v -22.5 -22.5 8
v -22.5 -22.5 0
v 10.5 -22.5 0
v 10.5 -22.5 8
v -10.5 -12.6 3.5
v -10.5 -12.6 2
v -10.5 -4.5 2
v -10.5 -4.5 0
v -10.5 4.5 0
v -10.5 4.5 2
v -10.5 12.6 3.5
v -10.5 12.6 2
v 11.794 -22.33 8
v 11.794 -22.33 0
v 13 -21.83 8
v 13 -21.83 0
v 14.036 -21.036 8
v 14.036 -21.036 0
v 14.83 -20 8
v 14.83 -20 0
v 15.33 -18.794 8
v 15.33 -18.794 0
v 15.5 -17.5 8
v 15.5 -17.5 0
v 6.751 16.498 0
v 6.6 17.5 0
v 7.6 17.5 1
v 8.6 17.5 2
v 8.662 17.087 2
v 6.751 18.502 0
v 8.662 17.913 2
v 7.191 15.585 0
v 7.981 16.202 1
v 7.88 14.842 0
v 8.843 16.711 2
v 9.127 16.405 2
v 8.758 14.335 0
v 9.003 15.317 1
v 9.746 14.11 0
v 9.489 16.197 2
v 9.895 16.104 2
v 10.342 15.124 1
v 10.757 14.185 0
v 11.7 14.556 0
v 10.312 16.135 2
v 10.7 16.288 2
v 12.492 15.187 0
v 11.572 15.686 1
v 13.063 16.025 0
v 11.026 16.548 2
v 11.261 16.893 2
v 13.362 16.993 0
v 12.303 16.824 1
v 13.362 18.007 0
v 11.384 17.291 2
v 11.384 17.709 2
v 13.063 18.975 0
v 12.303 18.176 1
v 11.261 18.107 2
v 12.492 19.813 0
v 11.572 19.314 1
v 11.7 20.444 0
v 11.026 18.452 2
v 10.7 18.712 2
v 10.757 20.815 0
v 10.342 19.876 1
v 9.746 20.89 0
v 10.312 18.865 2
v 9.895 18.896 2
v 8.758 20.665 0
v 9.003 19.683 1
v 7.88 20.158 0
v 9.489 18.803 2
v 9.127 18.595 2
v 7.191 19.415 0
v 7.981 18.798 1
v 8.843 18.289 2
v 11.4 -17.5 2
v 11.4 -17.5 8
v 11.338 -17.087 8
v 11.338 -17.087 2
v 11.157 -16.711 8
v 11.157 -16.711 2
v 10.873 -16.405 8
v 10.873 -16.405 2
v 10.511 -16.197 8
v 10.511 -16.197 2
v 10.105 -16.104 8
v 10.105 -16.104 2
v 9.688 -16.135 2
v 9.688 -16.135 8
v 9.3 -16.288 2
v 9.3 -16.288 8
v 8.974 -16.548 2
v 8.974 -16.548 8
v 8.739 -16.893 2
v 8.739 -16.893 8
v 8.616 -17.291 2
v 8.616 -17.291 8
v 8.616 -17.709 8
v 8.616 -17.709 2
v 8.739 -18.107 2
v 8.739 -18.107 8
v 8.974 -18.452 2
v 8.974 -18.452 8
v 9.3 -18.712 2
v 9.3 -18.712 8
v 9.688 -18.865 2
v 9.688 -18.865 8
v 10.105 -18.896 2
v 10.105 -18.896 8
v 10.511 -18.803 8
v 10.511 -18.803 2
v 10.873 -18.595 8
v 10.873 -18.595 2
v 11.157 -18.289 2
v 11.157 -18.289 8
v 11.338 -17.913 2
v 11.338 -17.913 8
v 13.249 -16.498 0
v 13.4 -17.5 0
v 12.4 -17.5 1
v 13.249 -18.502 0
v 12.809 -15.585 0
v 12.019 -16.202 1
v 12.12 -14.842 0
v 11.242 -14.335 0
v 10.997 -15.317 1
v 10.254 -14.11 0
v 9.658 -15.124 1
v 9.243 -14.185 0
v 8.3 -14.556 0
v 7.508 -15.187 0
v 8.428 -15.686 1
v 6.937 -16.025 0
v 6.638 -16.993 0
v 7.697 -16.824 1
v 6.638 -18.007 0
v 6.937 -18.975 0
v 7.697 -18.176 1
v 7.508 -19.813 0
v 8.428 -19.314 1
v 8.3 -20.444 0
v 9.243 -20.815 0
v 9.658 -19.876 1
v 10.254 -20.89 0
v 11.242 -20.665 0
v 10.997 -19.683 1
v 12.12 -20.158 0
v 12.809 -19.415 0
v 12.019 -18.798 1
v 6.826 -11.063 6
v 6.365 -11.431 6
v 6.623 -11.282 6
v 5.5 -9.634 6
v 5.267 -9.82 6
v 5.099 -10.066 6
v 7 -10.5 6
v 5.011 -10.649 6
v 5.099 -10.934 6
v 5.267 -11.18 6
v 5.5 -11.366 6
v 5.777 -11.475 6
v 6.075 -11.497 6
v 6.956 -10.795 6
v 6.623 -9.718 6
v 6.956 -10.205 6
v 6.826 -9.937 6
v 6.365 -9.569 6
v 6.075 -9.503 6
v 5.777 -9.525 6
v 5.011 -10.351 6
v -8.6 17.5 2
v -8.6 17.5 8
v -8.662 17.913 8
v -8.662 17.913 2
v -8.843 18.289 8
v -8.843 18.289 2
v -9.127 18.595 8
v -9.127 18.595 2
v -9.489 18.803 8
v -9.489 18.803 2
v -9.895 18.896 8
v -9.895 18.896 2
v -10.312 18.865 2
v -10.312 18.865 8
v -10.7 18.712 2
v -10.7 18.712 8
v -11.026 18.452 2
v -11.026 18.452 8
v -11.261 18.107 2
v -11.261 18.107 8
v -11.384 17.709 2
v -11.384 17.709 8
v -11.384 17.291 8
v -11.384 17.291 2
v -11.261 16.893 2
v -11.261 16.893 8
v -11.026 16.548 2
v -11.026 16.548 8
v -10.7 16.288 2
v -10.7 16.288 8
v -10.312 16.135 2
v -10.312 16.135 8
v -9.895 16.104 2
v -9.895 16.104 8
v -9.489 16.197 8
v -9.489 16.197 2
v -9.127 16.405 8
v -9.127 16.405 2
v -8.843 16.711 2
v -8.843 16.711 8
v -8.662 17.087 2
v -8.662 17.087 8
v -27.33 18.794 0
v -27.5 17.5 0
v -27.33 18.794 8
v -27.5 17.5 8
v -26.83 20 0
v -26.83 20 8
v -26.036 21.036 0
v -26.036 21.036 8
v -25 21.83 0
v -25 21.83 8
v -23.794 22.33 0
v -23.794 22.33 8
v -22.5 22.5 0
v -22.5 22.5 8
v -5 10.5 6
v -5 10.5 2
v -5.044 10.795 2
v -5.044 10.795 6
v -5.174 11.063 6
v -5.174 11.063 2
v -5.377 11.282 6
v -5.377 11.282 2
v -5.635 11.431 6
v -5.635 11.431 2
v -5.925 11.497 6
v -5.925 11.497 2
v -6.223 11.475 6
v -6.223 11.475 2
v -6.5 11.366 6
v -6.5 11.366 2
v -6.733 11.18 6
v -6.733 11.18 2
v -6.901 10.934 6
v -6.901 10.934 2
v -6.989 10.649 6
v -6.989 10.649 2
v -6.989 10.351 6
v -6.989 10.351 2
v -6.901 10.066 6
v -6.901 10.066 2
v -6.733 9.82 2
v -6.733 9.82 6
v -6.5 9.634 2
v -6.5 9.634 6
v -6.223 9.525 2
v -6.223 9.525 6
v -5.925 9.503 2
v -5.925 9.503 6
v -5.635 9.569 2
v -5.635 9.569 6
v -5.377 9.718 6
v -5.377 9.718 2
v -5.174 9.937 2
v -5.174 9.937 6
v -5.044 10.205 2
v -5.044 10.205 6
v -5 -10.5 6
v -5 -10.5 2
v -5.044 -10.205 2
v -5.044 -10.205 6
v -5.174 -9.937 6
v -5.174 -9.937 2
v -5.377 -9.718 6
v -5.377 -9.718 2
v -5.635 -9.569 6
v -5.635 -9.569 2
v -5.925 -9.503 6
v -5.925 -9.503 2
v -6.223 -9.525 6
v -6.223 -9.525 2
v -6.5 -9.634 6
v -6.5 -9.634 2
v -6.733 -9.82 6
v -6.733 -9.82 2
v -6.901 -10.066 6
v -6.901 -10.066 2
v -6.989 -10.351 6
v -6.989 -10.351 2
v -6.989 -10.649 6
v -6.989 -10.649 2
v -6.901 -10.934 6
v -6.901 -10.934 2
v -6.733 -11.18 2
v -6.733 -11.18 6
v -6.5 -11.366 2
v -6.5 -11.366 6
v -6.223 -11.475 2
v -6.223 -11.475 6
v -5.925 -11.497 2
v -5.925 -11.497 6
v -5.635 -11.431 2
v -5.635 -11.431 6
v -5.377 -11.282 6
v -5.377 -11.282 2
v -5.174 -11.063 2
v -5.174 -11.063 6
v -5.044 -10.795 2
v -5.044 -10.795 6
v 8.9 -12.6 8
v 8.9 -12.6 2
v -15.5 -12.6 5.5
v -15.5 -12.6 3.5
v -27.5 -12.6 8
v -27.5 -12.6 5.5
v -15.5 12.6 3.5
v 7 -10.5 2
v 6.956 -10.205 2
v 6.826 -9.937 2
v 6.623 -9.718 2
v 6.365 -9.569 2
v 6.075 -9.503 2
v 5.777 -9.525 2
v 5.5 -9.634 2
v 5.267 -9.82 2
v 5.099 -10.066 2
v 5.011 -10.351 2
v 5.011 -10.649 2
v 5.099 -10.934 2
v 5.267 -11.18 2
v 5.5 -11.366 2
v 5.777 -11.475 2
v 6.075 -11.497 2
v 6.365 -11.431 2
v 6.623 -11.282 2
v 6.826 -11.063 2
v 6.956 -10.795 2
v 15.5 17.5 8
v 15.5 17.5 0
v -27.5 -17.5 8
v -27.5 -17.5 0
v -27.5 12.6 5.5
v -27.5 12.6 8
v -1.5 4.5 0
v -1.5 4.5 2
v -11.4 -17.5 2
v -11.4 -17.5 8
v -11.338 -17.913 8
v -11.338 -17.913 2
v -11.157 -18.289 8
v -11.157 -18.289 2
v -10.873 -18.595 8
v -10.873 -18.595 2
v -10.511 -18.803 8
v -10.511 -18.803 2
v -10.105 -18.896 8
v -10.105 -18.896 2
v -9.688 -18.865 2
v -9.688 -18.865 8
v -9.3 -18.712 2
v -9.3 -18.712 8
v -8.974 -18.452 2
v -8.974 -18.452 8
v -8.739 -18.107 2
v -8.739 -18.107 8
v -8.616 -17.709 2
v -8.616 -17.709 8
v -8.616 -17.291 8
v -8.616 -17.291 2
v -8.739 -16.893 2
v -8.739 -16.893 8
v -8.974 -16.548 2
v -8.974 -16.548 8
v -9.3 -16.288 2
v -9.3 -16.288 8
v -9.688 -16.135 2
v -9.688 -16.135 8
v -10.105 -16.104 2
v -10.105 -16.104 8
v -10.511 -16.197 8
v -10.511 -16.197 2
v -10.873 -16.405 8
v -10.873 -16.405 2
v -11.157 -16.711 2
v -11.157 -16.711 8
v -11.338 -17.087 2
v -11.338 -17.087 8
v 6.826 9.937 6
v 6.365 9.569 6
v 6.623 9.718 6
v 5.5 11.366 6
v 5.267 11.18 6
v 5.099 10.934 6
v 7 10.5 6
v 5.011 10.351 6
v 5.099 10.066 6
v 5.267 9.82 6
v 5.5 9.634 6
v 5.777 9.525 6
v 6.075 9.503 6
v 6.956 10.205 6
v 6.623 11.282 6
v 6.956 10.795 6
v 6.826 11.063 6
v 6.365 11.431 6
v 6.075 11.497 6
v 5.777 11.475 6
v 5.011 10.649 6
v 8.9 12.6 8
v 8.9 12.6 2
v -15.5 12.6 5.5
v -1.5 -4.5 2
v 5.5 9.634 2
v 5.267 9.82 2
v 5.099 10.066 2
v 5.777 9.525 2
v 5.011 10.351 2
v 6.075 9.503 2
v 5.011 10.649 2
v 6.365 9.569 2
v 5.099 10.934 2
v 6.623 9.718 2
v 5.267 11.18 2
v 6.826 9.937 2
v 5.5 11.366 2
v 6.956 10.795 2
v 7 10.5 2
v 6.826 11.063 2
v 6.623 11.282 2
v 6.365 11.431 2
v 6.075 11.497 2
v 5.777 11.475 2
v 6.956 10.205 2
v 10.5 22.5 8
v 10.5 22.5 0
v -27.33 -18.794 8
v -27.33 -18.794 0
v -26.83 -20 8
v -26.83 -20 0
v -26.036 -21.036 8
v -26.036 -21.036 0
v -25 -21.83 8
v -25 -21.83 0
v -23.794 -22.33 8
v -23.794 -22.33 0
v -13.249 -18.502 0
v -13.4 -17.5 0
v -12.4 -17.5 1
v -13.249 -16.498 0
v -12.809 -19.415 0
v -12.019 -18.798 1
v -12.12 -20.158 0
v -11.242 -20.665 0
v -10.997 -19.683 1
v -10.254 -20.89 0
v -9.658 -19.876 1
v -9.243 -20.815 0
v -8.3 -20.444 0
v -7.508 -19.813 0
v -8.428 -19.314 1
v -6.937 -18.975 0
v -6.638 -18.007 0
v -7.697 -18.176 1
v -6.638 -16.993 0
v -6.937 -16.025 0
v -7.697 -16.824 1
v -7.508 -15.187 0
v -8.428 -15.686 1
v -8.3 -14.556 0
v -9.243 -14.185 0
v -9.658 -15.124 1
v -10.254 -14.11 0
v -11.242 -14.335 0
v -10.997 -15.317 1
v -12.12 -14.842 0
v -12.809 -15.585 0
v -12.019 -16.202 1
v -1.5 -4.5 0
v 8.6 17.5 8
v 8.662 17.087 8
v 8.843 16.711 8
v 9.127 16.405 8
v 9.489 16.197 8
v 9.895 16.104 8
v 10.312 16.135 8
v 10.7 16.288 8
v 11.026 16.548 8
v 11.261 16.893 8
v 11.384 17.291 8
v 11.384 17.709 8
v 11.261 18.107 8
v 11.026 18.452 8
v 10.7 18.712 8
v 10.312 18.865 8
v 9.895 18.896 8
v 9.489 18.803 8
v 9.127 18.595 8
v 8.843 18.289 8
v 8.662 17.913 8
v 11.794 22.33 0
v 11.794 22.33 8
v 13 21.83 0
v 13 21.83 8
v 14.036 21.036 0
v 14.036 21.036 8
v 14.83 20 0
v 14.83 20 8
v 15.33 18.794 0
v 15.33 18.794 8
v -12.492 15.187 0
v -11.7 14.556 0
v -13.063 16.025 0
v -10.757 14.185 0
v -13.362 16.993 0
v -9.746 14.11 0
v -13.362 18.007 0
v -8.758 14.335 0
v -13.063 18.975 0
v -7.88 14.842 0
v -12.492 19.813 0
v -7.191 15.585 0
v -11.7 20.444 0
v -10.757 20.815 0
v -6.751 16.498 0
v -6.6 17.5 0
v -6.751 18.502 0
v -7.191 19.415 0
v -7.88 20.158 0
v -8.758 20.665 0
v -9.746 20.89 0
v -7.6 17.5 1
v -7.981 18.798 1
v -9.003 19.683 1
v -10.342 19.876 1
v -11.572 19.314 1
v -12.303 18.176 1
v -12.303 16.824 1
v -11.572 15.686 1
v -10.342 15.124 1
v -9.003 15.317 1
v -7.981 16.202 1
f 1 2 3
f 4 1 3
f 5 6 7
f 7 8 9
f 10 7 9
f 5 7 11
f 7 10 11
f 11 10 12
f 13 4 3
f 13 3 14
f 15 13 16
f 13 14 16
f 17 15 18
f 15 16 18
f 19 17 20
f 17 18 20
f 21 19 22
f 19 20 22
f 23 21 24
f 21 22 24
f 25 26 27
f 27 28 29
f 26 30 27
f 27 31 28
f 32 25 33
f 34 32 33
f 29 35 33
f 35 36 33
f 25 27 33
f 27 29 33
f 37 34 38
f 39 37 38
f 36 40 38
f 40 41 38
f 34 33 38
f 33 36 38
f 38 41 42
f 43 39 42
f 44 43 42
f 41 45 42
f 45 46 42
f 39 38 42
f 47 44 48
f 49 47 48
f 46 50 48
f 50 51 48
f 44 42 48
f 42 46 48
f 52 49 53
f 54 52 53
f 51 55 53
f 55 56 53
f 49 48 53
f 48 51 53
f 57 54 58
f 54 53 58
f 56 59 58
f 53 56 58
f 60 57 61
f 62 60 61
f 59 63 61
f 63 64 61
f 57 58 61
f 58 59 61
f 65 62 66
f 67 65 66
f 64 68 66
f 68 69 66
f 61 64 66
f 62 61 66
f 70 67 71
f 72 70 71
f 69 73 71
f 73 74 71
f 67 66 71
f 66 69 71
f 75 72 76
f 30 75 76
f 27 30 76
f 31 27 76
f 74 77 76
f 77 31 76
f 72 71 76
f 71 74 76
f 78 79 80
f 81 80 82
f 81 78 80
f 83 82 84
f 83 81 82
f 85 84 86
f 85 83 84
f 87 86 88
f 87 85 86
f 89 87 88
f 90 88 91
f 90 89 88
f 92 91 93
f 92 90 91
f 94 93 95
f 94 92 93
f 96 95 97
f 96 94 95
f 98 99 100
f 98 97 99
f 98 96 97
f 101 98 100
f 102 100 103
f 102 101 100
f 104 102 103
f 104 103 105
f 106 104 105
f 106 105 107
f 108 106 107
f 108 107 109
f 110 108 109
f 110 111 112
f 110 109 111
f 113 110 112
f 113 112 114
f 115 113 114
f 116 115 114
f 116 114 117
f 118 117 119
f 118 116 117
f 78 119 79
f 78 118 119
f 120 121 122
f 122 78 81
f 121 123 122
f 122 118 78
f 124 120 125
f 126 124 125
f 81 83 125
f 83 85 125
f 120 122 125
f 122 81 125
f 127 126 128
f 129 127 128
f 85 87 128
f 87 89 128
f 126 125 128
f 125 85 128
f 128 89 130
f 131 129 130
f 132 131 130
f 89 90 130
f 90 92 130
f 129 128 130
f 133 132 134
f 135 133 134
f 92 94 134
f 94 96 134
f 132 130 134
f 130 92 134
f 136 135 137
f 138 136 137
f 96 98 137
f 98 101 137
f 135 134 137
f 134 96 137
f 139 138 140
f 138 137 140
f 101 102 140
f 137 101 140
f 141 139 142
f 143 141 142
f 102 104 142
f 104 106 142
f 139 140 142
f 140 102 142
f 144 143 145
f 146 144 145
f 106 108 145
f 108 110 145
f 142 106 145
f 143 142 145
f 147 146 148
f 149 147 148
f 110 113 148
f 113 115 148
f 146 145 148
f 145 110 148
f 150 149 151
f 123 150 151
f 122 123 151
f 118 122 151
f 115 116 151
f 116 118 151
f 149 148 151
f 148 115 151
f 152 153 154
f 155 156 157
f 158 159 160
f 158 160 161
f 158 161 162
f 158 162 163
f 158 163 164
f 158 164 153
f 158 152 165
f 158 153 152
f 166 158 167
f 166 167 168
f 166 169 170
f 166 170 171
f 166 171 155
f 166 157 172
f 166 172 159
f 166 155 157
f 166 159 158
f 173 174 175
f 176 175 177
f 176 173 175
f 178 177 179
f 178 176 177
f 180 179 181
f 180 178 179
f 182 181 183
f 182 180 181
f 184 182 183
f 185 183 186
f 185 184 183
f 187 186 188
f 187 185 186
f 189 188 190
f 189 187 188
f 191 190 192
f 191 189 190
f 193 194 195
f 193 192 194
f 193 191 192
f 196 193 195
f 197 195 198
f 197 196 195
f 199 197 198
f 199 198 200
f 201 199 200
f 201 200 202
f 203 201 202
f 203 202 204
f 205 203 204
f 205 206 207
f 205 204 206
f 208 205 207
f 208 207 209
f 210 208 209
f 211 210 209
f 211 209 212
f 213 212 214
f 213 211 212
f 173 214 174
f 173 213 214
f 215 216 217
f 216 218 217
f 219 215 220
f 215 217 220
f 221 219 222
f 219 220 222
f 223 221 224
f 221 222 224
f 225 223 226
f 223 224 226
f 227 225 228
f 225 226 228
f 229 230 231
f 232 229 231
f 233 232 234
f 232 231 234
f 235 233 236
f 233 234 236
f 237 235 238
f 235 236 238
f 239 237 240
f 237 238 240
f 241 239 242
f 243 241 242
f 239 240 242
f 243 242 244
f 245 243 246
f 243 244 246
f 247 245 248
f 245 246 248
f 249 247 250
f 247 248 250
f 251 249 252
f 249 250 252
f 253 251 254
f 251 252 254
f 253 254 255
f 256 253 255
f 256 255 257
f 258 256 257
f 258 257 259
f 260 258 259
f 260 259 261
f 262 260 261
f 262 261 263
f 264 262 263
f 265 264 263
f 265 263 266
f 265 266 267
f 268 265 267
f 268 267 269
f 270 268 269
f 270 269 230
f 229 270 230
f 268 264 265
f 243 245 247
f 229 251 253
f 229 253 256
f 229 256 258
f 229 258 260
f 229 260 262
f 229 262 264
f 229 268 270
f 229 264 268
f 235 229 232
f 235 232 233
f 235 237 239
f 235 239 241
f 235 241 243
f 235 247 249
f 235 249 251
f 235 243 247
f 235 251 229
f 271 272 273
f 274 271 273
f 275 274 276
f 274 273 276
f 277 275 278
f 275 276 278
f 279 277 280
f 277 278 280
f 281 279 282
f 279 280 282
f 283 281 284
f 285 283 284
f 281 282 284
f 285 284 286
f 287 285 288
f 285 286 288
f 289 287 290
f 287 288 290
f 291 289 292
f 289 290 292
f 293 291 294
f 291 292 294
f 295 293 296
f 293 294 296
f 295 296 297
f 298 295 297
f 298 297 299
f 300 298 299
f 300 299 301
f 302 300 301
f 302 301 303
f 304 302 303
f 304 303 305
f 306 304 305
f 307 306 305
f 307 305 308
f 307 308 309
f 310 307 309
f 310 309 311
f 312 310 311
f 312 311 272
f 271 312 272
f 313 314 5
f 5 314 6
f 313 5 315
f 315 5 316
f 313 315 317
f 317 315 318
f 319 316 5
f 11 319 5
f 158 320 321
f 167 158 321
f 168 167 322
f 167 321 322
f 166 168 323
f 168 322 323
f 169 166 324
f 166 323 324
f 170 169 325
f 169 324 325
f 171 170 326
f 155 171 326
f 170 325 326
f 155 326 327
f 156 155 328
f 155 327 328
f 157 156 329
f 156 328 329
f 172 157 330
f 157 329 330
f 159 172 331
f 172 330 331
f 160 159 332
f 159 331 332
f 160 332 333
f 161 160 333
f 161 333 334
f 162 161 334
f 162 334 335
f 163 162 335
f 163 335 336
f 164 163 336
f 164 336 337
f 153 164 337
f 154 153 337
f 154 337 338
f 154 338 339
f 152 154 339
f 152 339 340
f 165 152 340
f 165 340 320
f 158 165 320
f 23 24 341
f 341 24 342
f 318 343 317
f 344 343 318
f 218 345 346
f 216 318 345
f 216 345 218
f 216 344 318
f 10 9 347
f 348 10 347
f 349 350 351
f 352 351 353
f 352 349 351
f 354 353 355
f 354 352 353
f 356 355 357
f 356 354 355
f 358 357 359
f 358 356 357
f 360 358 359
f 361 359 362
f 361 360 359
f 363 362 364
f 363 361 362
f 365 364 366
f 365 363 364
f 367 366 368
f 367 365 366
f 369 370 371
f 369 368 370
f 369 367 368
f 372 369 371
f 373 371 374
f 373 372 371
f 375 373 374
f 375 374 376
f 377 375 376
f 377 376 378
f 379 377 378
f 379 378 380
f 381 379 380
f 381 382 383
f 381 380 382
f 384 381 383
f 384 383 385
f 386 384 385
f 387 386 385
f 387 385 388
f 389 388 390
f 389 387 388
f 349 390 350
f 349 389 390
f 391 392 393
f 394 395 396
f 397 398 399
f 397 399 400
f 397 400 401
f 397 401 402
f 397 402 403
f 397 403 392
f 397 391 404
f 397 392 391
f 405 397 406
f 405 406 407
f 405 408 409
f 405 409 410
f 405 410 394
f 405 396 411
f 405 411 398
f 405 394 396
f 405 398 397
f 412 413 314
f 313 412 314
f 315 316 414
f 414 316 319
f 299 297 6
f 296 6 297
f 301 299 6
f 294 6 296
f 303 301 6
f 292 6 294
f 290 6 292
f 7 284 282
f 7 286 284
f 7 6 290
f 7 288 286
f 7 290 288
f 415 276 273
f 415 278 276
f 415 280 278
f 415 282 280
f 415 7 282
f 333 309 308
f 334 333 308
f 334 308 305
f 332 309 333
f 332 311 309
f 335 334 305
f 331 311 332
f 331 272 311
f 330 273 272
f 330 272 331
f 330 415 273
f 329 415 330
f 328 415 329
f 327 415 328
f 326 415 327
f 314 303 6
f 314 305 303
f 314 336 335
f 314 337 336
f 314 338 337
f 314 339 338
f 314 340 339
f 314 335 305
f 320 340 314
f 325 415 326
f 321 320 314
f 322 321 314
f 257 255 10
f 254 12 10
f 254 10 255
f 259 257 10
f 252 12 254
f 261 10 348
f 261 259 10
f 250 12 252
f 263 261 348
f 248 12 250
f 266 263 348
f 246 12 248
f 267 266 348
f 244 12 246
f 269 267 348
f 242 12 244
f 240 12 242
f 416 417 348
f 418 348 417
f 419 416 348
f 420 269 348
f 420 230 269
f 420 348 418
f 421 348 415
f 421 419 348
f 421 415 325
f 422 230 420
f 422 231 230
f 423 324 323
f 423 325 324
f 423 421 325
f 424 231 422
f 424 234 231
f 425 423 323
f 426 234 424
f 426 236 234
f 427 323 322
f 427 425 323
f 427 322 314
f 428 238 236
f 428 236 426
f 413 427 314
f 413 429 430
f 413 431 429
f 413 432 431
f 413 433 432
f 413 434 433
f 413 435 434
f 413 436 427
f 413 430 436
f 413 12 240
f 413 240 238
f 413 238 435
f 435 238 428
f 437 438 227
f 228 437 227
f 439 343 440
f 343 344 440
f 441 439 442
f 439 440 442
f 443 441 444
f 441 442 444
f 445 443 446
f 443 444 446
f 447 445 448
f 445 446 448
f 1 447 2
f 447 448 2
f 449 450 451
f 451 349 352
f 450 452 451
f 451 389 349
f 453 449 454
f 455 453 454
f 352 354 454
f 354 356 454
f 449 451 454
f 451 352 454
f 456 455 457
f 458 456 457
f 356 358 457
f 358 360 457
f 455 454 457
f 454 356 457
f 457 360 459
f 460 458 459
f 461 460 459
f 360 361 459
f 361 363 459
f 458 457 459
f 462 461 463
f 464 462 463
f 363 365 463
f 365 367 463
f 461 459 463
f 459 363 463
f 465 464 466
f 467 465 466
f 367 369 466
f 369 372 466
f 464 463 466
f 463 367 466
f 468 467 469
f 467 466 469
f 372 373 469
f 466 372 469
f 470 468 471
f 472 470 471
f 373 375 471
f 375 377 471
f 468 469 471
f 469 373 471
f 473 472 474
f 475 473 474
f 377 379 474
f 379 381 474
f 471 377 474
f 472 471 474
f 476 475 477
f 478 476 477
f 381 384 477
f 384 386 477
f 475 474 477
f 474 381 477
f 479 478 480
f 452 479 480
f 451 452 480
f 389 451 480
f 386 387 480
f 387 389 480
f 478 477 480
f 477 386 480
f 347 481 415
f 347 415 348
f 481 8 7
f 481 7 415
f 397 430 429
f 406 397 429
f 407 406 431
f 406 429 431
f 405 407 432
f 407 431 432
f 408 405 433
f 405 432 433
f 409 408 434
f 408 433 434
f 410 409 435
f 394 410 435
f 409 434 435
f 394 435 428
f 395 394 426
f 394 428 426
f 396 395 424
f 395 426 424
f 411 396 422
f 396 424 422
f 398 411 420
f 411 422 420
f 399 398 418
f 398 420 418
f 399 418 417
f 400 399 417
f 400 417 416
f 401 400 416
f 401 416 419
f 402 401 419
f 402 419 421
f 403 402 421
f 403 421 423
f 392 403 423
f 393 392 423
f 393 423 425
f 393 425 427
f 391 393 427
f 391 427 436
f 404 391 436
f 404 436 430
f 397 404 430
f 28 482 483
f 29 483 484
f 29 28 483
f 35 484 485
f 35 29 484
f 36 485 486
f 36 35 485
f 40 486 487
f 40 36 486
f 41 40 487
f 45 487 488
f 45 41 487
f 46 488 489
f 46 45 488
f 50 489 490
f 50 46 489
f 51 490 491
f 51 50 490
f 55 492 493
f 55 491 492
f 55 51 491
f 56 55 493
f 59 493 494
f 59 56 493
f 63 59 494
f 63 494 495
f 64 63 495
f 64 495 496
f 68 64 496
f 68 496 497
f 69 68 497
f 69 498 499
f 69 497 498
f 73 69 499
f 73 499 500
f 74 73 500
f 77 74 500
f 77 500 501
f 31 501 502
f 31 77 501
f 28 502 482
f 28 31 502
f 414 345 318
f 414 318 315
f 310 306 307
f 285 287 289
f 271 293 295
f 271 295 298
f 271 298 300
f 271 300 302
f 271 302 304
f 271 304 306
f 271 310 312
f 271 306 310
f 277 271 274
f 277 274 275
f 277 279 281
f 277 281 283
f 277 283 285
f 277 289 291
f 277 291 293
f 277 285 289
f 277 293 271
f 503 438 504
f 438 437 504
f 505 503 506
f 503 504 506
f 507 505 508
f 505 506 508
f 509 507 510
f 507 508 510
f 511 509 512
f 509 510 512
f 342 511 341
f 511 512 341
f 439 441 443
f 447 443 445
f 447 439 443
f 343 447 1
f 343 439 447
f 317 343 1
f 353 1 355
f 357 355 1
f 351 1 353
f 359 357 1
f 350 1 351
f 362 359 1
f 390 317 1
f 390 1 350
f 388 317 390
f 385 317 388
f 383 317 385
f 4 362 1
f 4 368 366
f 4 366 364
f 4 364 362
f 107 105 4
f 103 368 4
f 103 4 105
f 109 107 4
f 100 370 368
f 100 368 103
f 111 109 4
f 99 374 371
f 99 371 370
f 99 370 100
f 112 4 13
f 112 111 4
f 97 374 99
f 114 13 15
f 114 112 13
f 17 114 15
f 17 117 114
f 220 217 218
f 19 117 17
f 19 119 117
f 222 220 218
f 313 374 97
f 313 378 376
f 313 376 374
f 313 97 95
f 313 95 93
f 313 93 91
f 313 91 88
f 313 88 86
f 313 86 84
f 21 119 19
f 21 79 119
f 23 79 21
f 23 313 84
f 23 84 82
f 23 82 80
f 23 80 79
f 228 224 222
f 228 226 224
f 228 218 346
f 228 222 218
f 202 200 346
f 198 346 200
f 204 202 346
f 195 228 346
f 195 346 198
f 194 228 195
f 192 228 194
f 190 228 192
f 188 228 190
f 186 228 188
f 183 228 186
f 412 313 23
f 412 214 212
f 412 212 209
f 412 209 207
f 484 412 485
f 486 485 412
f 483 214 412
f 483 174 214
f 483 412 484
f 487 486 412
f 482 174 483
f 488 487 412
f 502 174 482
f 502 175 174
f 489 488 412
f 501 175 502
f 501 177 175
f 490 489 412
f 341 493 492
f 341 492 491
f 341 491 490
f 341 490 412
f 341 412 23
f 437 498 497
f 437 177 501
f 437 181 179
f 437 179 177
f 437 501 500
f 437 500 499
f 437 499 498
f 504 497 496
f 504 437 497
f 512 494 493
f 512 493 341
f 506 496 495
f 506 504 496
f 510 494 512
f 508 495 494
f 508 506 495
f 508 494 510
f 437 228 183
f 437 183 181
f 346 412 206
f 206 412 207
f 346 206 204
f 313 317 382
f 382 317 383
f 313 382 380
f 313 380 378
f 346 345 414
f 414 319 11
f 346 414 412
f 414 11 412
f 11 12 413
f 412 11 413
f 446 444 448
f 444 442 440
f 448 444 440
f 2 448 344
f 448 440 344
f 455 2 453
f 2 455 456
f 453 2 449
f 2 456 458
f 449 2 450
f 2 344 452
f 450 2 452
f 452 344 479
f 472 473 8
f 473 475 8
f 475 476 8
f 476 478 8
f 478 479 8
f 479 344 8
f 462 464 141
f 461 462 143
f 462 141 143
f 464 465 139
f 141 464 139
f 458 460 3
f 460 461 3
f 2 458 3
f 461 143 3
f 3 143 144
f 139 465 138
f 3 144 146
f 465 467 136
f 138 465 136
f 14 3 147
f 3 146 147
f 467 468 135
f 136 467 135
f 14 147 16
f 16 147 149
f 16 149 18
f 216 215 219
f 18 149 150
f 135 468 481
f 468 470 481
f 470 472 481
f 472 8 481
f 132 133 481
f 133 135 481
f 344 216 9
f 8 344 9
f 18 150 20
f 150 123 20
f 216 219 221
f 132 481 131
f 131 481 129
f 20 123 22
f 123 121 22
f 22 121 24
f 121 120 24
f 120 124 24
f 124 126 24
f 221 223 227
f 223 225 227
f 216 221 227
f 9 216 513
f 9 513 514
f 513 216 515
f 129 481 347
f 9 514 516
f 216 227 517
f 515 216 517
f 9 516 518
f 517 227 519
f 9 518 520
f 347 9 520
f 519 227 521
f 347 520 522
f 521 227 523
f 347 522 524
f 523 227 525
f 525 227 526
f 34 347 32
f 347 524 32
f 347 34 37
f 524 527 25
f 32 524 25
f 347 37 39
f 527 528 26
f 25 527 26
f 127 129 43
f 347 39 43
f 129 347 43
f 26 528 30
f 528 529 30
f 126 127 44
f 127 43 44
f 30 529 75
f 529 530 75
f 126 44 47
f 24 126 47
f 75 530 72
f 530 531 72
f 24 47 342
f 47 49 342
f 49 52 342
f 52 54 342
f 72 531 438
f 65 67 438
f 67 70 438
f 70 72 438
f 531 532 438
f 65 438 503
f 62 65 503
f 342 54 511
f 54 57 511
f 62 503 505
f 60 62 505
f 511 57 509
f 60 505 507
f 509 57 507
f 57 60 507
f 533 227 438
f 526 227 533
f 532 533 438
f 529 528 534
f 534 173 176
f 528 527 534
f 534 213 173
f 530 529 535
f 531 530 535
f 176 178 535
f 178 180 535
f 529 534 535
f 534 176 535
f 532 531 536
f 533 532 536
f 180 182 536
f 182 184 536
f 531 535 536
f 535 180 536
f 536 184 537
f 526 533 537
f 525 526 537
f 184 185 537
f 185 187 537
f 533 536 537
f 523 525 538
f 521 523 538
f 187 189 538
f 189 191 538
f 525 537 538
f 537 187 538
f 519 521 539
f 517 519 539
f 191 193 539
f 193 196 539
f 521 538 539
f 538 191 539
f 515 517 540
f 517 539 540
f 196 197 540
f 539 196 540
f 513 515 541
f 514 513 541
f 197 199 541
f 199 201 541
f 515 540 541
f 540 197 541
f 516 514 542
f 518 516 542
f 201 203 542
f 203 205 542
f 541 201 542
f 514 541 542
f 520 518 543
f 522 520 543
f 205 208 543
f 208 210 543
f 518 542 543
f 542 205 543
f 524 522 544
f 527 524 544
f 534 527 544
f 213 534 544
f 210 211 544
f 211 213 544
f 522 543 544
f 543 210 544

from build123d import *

# Parameters (mm, degrees)
SKETCH_1_R          = 1
SKETCH_1_W          = 9
SKETCH_1_H          = 9
EXTRUDE_1_DEPTH     = 2
SKETCH_3_W          = 17
SKETCH_3_H          = 45
EXTRUDE_3_DEPTH     = 1.5
EXTRUDE_4_DEPTH     = 6
SKETCH_1_3_R        = 1
EXTRUDE_5_DEPTH     = 6
SKETCH_6_R          = 1.4
CUT_EXTRUDE_1_DEPTH = 37.421147703
CHAMFER_1_SIZE      = 2
SKETCH_7_W          = 12
SKETCH_7_H          = 25.2
EXTRUDE_6_DEPTH     = 2
FILLET_1_R          = 5


with BuildPart() as part:
    # 스케치1 → 보스-돌출1 (new body)
    with BuildSketch(Plane.XY):
        Polygon((15.5, 22.5), (-15.5, 22.5), (-27.5, 22.5), (-27.5, -22.5), (-15.5, -22.5), (15.5, -22.5), align=None)
        with Locations((-6, -10.5)):
            Circle(SKETCH_1_R, mode=Mode.SUBTRACT)
        with Locations((-6, 0)):
            Rectangle(SKETCH_1_W, SKETCH_1_H, mode=Mode.SUBTRACT)
        with Locations((6, -10.5)):
            Circle(SKETCH_1_R, mode=Mode.SUBTRACT)
        with Locations((-6, 10.5)):
            Circle(SKETCH_1_R, mode=Mode.SUBTRACT)
        with Locations((6, 10.5)):
            Circle(SKETCH_1_R, mode=Mode.SUBTRACT)
    extrude(amount=EXTRUDE_1_DEPTH)

    # 스케치3 → 보스-돌출3 (add)
    with BuildSketch(Plane.XY.offset(2)):
        with Locations((-19, 0)):
            Rectangle(SKETCH_3_W, SKETCH_3_H)
    extrude(amount=EXTRUDE_3_DEPTH)

    # 스케치4 → 보스-돌출4 (add)
    with BuildSketch(Plane.XY.offset(2)):
        Polygon((-15.5, -22.5), (15.5, -22.5), (15.5, 22.5), (-15.5, 22.5), (-27.5, 22.5), (-27.5, 12.6), (-15.5, 12.6), (8.9, 12.6), (8.9, -12.6), (-15.5, -12.6), (-27.5, -12.6), (-27.5, -22.5), align=None)
    extrude(amount=EXTRUDE_4_DEPTH)

    # 스케치1<3> → 보스-돌출5 (add)
    with BuildSketch(Plane.XY):
        with Locations((-6, 10.5)):
            Circle(SKETCH_1_3_R)
        with Locations((6, 10.5)):
            Circle(SKETCH_1_3_R)
        with Locations((6, -10.5)):
            Circle(SKETCH_1_3_R)
        with Locations((-6, -10.5)):
            Circle(SKETCH_1_3_R)
    extrude(amount=EXTRUDE_5_DEPTH)

    # 스케치6 → 컷-돌출1 (cut, through all)
    with BuildSketch(Plane.XY):
        with Locations((-10, 17.5)):
            Circle(SKETCH_6_R)
        with Locations((10, 17.5)):
            Circle(SKETCH_6_R)
        with Locations((10, -17.5)):
            Circle(SKETCH_6_R)
        with Locations((-10, -17.5)):
            Circle(SKETCH_6_R)
    extrude(amount=CUT_EXTRUDE_1_DEPTH, mode=Mode.SUBTRACT)

    # 모따기1
    chamfer_1_edges = [part.edges().sort_by_distance(p)[0] for p in [
        (8.6, 17.5, 0),
        (-11.4, 17.5, 0),
        (-11.4, -17.5, 0),
        (8.6, -17.5, 0),
    ]]
    chamfer(chamfer_1_edges, length=CHAMFER_1_SIZE)

    # 스케치7 → 보스-돌출6 (add)
    with BuildSketch(Plane.XY.offset(3.5)):
        with Locations((-21.5, 0)):
            Rectangle(SKETCH_7_W, SKETCH_7_H)
    extrude(amount=EXTRUDE_6_DEPTH)

    # 필렛1
    fillet_1_edges = [part.edges().sort_by_distance(p)[0] for p in [
        (15.5, -22.5, 4),
        (15.5, 22.5, 4),
        (-27.5, 22.5, 4),
        (-27.5, -22.5, 4),
    ]]
    fillet(fillet_1_edges, radius=FILLET_1_R)


solid = part.part
